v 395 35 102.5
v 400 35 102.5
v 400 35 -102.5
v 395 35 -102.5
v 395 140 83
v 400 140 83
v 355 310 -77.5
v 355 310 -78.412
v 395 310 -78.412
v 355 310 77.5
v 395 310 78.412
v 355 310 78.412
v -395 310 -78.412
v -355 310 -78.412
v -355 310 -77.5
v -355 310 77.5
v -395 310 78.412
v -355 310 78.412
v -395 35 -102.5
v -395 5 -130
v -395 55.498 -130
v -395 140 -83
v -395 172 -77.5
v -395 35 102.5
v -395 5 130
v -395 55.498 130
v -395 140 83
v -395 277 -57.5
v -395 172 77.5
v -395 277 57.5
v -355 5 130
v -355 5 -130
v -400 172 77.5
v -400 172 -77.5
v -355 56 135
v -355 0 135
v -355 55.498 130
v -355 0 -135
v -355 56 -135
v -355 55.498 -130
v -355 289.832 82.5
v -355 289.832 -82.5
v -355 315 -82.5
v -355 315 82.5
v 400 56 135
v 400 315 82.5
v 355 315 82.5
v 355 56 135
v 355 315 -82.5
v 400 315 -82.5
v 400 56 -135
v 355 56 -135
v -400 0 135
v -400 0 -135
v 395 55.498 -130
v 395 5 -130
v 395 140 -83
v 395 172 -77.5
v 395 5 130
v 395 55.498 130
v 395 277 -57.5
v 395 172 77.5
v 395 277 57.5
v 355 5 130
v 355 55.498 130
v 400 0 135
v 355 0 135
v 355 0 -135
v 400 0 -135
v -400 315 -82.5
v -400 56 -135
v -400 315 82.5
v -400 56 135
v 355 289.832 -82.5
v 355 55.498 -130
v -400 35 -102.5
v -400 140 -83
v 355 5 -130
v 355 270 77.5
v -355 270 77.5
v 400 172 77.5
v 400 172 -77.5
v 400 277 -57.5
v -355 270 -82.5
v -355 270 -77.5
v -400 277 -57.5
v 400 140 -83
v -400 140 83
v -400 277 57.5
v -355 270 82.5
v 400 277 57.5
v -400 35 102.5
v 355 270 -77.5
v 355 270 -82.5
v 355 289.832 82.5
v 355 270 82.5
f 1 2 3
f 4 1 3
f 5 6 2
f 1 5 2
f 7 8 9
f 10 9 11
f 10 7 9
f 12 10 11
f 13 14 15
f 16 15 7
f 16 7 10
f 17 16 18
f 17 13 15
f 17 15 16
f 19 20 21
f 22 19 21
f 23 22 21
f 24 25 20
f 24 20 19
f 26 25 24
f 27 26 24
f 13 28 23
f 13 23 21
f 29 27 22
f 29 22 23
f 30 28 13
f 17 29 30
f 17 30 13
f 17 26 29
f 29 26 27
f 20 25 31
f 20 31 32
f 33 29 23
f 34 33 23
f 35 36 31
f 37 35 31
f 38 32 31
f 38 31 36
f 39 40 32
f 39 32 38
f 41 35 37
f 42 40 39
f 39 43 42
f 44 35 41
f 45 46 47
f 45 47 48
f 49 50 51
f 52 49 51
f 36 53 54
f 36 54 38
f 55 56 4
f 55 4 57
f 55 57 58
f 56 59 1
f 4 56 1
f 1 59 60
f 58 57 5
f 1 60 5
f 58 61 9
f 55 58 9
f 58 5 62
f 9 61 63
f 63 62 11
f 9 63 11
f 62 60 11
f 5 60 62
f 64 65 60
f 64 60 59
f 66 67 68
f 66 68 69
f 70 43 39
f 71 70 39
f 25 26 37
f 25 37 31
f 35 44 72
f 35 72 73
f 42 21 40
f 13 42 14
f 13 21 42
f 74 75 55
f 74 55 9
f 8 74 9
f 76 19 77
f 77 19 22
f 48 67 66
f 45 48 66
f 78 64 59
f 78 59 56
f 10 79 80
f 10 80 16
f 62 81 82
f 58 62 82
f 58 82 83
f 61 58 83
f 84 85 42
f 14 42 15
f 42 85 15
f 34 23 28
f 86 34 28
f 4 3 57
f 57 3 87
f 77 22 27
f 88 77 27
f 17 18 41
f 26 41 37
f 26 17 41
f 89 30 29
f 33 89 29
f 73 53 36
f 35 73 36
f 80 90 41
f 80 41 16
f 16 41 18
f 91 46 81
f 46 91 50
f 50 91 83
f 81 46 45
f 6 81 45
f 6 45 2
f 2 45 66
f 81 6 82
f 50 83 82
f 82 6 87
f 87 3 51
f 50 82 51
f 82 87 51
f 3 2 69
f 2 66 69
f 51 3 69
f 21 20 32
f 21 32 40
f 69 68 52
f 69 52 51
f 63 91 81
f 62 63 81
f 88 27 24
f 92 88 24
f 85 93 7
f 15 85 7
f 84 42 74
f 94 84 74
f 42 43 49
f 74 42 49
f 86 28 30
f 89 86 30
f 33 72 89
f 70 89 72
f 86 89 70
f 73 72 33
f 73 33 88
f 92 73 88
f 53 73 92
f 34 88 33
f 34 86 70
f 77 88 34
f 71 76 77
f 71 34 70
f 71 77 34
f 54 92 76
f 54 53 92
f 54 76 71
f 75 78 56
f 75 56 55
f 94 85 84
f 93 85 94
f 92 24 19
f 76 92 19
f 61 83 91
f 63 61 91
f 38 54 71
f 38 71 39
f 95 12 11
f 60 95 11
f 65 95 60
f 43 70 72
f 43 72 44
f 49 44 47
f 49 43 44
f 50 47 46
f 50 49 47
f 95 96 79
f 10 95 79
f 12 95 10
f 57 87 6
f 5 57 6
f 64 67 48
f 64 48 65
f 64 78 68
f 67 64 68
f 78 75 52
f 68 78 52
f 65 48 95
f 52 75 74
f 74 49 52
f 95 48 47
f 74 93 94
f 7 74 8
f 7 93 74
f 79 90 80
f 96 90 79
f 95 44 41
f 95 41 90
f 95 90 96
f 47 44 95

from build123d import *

# Parameters (mm, degrees)
CROQUIS1_W              = 800
CROQUIS1_H              = 270
SALIENTE_EXTRUIR1_DEPTH = 315
CROQUIS2_W              = 710
CROQUIS2_H              = 52.5
CORTAR_EXTRUIR2_DEPTH   = 315
CORTAR_EXTRUIR6_DEPTH   = 800
CROQUIS8_W              = 710
CROQUIS8_H              = 270
CORTAR_EXTRUIR7_DEPTH   = 200
VACIADO5_START          = -395
VACIADO5_OUTLINE_W      = 40
VACIADO5_OUTLINE_H      = 155
VACIADO5_DEPTH          = 790
VACIADO5_2_DEPTH        = 40
VACIADO5_START_2        = 355
VACIADO5_3_DEPTH        = 40
CORTAR_EXTRUIR8_DEPTH   = 800


# Read off the part's stored shape, not the designer's step: Vaciado5
with BuildPart() as part:
    # Croquis1 → Saliente-Extruir1 (new body)
    with BuildSketch(Plane(origin=(0, 0, 0), x_dir=(1, 0, 0), z_dir=(0, 1, 0))):
        Rectangle(CROQUIS1_W, CROQUIS1_H)
    extrude(amount=SALIENTE_EXTRUIR1_DEPTH)

    # Croquis2 → Cortar-Extruir2 (cut)
    with BuildSketch(Plane(origin=(0, 315, 0), x_dir=(1, 0, 0), z_dir=(0, 1, 0))):
        with Locations((0, 108.75)):
            Rectangle(CROQUIS2_W, CROQUIS2_H)
        with Locations((0, -108.75)):
            Rectangle(CROQUIS2_W, CROQUIS2_H)
    extrude(amount=-CORTAR_EXTRUIR2_DEPTH, mode=Mode.SUBTRACT)

    # Croquis4 → Cortar-Extruir6 (cut)
    with BuildSketch(Plane(origin=(400, 0, 0), x_dir=(0, 0, -1), z_dir=(1, 0, 0))):
        Polygon((135, 315), (82.5, 315), (135, 56), align=None)
        Polygon((-135, 315), (-82.5, 315), (-135, 56), align=None)
    extrude(amount=-CORTAR_EXTRUIR6_DEPTH, mode=Mode.SUBTRACT)

    # Croquis8 → Cortar-Extruir7 (cut)
    with BuildSketch(Plane.XY.offset(82.5)):
        with Locations((0, 135)):
            Rectangle(CROQUIS8_W, CROQUIS8_H)
    extrude(amount=-CORTAR_EXTRUIR7_DEPTH, mode=Mode.SUBTRACT)

    # Vaciado5 outline → Vaciado5 (cut)
    with BuildSketch(Plane.YZ.offset(VACIADO5_START)):
        with Locations((290, 0)):
            Rectangle(VACIADO5_OUTLINE_W, VACIADO5_OUTLINE_H)
    extrude(amount=VACIADO5_DEPTH, mode=Mode.SUBTRACT)

    # Vaciado5 2 outline → Vaciado5 2 (cut)
    with BuildSketch(Plane.YZ.offset(VACIADO5_START)):
        Polygon((5, 130), (5, -130), (55.498344425, -130), (310, -78.411826573), (310, -77.5), (270, -77.5), (270, 77.5), (310, 77.5), (310, 78.411826573), (55.498344425, 130), align=None)
    extrude(amount=VACIADO5_2_DEPTH, mode=Mode.SUBTRACT)

    # Vaciado5 3 outline → Vaciado5 3 (cut)
    with BuildSketch(Plane.YZ.offset(VACIADO5_START_2)):
        Polygon((5, 130), (5, -130), (55.498344425, -130), (310, -78.411826573), (310, -77.5), (270, -77.5), (270, 77.5), (310, 77.5), (310, 78.411826573), (55.498344425, 130), align=None)
    extrude(amount=VACIADO5_3_DEPTH, mode=Mode.SUBTRACT)

    # Croquis9 → Cortar-Extruir8 (cut)
    with BuildSketch(Plane(origin=(400, 0, 0), x_dir=(0, 0, -1), z_dir=(1, 0, 0))):
        Polygon((-102.5, 35), (102.5, 35), (83, 140), (-83, 140), align=None)
        Polygon((-77.5, 172), (77.5, 172), (57.5, 277), (-57.5, 277), align=None)
    extrude(amount=-CORTAR_EXTRUIR8_DEPTH, mode=Mode.SUBTRACT)


solid = part.part
